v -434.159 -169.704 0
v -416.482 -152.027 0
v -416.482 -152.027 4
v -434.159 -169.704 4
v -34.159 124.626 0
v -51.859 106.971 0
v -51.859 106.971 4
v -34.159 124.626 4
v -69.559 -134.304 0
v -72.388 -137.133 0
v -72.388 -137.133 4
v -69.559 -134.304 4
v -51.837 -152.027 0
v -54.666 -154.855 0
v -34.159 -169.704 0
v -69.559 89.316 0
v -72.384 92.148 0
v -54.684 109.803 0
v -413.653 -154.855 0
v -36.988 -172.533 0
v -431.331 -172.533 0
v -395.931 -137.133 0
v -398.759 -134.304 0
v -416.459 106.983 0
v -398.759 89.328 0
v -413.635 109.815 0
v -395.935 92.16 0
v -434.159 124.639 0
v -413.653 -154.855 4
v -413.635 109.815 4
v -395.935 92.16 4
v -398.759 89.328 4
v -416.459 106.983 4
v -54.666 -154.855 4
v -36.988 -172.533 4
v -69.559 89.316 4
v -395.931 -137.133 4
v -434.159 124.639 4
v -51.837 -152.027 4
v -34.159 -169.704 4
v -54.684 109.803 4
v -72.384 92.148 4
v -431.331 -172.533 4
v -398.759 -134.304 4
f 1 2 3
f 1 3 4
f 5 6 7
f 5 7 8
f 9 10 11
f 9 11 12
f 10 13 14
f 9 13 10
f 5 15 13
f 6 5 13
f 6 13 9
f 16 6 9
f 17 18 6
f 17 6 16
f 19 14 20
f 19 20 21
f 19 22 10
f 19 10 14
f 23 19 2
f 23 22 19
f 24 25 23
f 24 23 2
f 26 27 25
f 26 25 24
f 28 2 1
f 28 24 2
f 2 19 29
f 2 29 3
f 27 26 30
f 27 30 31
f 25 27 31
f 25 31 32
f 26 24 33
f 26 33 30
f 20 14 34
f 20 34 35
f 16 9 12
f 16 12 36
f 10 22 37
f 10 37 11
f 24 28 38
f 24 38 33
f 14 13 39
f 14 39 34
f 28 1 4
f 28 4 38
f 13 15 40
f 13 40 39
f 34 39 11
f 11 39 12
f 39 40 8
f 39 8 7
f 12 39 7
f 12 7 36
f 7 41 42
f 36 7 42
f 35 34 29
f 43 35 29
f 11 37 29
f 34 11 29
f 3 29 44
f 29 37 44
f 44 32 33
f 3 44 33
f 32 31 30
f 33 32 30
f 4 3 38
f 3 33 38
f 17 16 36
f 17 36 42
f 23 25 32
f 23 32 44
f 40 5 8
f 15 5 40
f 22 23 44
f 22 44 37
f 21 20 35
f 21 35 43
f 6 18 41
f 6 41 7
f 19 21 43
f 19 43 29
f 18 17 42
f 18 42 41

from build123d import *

# Parameters (mm, degrees)
BOSS_EXTRU_1_DEPTH = 4


with BuildPart() as part:
    # Esquisse1 → Boss.-Extru.1 (new body)
    with BuildSketch(Plane.XY):
        Polygon((-72.387865901, -137.132902491), (-69.559438777, -134.304475366), (-69.559438777, 89.31574626), (-72.384288507, 92.14774626), (-54.684288507, 109.803057076), (-51.859438777, 106.971057076), (-34.159438777, 124.626367892), (-34.159438777, -169.704475366), (-51.837108306, -152.026805837), (-54.665535431, -154.855232961), (-36.987865901, -172.532902491), (-431.331011652, -172.532902491), (-413.653342122, -154.855232961), (-416.481769247, -152.026805837), (-434.159438777, -169.704475366), (-434.159438777, 124.638670384), (-416.459438777, 106.983359568), (-413.634589046, 109.815359568), (-395.934589046, 92.160048753), (-398.759438777, 89.328048753), (-398.759438777, -134.304475366), (-395.931011652, -137.132902491), align=None)
    extrude(amount=BOSS_EXTRU_1_DEPTH)


solid = part.part
